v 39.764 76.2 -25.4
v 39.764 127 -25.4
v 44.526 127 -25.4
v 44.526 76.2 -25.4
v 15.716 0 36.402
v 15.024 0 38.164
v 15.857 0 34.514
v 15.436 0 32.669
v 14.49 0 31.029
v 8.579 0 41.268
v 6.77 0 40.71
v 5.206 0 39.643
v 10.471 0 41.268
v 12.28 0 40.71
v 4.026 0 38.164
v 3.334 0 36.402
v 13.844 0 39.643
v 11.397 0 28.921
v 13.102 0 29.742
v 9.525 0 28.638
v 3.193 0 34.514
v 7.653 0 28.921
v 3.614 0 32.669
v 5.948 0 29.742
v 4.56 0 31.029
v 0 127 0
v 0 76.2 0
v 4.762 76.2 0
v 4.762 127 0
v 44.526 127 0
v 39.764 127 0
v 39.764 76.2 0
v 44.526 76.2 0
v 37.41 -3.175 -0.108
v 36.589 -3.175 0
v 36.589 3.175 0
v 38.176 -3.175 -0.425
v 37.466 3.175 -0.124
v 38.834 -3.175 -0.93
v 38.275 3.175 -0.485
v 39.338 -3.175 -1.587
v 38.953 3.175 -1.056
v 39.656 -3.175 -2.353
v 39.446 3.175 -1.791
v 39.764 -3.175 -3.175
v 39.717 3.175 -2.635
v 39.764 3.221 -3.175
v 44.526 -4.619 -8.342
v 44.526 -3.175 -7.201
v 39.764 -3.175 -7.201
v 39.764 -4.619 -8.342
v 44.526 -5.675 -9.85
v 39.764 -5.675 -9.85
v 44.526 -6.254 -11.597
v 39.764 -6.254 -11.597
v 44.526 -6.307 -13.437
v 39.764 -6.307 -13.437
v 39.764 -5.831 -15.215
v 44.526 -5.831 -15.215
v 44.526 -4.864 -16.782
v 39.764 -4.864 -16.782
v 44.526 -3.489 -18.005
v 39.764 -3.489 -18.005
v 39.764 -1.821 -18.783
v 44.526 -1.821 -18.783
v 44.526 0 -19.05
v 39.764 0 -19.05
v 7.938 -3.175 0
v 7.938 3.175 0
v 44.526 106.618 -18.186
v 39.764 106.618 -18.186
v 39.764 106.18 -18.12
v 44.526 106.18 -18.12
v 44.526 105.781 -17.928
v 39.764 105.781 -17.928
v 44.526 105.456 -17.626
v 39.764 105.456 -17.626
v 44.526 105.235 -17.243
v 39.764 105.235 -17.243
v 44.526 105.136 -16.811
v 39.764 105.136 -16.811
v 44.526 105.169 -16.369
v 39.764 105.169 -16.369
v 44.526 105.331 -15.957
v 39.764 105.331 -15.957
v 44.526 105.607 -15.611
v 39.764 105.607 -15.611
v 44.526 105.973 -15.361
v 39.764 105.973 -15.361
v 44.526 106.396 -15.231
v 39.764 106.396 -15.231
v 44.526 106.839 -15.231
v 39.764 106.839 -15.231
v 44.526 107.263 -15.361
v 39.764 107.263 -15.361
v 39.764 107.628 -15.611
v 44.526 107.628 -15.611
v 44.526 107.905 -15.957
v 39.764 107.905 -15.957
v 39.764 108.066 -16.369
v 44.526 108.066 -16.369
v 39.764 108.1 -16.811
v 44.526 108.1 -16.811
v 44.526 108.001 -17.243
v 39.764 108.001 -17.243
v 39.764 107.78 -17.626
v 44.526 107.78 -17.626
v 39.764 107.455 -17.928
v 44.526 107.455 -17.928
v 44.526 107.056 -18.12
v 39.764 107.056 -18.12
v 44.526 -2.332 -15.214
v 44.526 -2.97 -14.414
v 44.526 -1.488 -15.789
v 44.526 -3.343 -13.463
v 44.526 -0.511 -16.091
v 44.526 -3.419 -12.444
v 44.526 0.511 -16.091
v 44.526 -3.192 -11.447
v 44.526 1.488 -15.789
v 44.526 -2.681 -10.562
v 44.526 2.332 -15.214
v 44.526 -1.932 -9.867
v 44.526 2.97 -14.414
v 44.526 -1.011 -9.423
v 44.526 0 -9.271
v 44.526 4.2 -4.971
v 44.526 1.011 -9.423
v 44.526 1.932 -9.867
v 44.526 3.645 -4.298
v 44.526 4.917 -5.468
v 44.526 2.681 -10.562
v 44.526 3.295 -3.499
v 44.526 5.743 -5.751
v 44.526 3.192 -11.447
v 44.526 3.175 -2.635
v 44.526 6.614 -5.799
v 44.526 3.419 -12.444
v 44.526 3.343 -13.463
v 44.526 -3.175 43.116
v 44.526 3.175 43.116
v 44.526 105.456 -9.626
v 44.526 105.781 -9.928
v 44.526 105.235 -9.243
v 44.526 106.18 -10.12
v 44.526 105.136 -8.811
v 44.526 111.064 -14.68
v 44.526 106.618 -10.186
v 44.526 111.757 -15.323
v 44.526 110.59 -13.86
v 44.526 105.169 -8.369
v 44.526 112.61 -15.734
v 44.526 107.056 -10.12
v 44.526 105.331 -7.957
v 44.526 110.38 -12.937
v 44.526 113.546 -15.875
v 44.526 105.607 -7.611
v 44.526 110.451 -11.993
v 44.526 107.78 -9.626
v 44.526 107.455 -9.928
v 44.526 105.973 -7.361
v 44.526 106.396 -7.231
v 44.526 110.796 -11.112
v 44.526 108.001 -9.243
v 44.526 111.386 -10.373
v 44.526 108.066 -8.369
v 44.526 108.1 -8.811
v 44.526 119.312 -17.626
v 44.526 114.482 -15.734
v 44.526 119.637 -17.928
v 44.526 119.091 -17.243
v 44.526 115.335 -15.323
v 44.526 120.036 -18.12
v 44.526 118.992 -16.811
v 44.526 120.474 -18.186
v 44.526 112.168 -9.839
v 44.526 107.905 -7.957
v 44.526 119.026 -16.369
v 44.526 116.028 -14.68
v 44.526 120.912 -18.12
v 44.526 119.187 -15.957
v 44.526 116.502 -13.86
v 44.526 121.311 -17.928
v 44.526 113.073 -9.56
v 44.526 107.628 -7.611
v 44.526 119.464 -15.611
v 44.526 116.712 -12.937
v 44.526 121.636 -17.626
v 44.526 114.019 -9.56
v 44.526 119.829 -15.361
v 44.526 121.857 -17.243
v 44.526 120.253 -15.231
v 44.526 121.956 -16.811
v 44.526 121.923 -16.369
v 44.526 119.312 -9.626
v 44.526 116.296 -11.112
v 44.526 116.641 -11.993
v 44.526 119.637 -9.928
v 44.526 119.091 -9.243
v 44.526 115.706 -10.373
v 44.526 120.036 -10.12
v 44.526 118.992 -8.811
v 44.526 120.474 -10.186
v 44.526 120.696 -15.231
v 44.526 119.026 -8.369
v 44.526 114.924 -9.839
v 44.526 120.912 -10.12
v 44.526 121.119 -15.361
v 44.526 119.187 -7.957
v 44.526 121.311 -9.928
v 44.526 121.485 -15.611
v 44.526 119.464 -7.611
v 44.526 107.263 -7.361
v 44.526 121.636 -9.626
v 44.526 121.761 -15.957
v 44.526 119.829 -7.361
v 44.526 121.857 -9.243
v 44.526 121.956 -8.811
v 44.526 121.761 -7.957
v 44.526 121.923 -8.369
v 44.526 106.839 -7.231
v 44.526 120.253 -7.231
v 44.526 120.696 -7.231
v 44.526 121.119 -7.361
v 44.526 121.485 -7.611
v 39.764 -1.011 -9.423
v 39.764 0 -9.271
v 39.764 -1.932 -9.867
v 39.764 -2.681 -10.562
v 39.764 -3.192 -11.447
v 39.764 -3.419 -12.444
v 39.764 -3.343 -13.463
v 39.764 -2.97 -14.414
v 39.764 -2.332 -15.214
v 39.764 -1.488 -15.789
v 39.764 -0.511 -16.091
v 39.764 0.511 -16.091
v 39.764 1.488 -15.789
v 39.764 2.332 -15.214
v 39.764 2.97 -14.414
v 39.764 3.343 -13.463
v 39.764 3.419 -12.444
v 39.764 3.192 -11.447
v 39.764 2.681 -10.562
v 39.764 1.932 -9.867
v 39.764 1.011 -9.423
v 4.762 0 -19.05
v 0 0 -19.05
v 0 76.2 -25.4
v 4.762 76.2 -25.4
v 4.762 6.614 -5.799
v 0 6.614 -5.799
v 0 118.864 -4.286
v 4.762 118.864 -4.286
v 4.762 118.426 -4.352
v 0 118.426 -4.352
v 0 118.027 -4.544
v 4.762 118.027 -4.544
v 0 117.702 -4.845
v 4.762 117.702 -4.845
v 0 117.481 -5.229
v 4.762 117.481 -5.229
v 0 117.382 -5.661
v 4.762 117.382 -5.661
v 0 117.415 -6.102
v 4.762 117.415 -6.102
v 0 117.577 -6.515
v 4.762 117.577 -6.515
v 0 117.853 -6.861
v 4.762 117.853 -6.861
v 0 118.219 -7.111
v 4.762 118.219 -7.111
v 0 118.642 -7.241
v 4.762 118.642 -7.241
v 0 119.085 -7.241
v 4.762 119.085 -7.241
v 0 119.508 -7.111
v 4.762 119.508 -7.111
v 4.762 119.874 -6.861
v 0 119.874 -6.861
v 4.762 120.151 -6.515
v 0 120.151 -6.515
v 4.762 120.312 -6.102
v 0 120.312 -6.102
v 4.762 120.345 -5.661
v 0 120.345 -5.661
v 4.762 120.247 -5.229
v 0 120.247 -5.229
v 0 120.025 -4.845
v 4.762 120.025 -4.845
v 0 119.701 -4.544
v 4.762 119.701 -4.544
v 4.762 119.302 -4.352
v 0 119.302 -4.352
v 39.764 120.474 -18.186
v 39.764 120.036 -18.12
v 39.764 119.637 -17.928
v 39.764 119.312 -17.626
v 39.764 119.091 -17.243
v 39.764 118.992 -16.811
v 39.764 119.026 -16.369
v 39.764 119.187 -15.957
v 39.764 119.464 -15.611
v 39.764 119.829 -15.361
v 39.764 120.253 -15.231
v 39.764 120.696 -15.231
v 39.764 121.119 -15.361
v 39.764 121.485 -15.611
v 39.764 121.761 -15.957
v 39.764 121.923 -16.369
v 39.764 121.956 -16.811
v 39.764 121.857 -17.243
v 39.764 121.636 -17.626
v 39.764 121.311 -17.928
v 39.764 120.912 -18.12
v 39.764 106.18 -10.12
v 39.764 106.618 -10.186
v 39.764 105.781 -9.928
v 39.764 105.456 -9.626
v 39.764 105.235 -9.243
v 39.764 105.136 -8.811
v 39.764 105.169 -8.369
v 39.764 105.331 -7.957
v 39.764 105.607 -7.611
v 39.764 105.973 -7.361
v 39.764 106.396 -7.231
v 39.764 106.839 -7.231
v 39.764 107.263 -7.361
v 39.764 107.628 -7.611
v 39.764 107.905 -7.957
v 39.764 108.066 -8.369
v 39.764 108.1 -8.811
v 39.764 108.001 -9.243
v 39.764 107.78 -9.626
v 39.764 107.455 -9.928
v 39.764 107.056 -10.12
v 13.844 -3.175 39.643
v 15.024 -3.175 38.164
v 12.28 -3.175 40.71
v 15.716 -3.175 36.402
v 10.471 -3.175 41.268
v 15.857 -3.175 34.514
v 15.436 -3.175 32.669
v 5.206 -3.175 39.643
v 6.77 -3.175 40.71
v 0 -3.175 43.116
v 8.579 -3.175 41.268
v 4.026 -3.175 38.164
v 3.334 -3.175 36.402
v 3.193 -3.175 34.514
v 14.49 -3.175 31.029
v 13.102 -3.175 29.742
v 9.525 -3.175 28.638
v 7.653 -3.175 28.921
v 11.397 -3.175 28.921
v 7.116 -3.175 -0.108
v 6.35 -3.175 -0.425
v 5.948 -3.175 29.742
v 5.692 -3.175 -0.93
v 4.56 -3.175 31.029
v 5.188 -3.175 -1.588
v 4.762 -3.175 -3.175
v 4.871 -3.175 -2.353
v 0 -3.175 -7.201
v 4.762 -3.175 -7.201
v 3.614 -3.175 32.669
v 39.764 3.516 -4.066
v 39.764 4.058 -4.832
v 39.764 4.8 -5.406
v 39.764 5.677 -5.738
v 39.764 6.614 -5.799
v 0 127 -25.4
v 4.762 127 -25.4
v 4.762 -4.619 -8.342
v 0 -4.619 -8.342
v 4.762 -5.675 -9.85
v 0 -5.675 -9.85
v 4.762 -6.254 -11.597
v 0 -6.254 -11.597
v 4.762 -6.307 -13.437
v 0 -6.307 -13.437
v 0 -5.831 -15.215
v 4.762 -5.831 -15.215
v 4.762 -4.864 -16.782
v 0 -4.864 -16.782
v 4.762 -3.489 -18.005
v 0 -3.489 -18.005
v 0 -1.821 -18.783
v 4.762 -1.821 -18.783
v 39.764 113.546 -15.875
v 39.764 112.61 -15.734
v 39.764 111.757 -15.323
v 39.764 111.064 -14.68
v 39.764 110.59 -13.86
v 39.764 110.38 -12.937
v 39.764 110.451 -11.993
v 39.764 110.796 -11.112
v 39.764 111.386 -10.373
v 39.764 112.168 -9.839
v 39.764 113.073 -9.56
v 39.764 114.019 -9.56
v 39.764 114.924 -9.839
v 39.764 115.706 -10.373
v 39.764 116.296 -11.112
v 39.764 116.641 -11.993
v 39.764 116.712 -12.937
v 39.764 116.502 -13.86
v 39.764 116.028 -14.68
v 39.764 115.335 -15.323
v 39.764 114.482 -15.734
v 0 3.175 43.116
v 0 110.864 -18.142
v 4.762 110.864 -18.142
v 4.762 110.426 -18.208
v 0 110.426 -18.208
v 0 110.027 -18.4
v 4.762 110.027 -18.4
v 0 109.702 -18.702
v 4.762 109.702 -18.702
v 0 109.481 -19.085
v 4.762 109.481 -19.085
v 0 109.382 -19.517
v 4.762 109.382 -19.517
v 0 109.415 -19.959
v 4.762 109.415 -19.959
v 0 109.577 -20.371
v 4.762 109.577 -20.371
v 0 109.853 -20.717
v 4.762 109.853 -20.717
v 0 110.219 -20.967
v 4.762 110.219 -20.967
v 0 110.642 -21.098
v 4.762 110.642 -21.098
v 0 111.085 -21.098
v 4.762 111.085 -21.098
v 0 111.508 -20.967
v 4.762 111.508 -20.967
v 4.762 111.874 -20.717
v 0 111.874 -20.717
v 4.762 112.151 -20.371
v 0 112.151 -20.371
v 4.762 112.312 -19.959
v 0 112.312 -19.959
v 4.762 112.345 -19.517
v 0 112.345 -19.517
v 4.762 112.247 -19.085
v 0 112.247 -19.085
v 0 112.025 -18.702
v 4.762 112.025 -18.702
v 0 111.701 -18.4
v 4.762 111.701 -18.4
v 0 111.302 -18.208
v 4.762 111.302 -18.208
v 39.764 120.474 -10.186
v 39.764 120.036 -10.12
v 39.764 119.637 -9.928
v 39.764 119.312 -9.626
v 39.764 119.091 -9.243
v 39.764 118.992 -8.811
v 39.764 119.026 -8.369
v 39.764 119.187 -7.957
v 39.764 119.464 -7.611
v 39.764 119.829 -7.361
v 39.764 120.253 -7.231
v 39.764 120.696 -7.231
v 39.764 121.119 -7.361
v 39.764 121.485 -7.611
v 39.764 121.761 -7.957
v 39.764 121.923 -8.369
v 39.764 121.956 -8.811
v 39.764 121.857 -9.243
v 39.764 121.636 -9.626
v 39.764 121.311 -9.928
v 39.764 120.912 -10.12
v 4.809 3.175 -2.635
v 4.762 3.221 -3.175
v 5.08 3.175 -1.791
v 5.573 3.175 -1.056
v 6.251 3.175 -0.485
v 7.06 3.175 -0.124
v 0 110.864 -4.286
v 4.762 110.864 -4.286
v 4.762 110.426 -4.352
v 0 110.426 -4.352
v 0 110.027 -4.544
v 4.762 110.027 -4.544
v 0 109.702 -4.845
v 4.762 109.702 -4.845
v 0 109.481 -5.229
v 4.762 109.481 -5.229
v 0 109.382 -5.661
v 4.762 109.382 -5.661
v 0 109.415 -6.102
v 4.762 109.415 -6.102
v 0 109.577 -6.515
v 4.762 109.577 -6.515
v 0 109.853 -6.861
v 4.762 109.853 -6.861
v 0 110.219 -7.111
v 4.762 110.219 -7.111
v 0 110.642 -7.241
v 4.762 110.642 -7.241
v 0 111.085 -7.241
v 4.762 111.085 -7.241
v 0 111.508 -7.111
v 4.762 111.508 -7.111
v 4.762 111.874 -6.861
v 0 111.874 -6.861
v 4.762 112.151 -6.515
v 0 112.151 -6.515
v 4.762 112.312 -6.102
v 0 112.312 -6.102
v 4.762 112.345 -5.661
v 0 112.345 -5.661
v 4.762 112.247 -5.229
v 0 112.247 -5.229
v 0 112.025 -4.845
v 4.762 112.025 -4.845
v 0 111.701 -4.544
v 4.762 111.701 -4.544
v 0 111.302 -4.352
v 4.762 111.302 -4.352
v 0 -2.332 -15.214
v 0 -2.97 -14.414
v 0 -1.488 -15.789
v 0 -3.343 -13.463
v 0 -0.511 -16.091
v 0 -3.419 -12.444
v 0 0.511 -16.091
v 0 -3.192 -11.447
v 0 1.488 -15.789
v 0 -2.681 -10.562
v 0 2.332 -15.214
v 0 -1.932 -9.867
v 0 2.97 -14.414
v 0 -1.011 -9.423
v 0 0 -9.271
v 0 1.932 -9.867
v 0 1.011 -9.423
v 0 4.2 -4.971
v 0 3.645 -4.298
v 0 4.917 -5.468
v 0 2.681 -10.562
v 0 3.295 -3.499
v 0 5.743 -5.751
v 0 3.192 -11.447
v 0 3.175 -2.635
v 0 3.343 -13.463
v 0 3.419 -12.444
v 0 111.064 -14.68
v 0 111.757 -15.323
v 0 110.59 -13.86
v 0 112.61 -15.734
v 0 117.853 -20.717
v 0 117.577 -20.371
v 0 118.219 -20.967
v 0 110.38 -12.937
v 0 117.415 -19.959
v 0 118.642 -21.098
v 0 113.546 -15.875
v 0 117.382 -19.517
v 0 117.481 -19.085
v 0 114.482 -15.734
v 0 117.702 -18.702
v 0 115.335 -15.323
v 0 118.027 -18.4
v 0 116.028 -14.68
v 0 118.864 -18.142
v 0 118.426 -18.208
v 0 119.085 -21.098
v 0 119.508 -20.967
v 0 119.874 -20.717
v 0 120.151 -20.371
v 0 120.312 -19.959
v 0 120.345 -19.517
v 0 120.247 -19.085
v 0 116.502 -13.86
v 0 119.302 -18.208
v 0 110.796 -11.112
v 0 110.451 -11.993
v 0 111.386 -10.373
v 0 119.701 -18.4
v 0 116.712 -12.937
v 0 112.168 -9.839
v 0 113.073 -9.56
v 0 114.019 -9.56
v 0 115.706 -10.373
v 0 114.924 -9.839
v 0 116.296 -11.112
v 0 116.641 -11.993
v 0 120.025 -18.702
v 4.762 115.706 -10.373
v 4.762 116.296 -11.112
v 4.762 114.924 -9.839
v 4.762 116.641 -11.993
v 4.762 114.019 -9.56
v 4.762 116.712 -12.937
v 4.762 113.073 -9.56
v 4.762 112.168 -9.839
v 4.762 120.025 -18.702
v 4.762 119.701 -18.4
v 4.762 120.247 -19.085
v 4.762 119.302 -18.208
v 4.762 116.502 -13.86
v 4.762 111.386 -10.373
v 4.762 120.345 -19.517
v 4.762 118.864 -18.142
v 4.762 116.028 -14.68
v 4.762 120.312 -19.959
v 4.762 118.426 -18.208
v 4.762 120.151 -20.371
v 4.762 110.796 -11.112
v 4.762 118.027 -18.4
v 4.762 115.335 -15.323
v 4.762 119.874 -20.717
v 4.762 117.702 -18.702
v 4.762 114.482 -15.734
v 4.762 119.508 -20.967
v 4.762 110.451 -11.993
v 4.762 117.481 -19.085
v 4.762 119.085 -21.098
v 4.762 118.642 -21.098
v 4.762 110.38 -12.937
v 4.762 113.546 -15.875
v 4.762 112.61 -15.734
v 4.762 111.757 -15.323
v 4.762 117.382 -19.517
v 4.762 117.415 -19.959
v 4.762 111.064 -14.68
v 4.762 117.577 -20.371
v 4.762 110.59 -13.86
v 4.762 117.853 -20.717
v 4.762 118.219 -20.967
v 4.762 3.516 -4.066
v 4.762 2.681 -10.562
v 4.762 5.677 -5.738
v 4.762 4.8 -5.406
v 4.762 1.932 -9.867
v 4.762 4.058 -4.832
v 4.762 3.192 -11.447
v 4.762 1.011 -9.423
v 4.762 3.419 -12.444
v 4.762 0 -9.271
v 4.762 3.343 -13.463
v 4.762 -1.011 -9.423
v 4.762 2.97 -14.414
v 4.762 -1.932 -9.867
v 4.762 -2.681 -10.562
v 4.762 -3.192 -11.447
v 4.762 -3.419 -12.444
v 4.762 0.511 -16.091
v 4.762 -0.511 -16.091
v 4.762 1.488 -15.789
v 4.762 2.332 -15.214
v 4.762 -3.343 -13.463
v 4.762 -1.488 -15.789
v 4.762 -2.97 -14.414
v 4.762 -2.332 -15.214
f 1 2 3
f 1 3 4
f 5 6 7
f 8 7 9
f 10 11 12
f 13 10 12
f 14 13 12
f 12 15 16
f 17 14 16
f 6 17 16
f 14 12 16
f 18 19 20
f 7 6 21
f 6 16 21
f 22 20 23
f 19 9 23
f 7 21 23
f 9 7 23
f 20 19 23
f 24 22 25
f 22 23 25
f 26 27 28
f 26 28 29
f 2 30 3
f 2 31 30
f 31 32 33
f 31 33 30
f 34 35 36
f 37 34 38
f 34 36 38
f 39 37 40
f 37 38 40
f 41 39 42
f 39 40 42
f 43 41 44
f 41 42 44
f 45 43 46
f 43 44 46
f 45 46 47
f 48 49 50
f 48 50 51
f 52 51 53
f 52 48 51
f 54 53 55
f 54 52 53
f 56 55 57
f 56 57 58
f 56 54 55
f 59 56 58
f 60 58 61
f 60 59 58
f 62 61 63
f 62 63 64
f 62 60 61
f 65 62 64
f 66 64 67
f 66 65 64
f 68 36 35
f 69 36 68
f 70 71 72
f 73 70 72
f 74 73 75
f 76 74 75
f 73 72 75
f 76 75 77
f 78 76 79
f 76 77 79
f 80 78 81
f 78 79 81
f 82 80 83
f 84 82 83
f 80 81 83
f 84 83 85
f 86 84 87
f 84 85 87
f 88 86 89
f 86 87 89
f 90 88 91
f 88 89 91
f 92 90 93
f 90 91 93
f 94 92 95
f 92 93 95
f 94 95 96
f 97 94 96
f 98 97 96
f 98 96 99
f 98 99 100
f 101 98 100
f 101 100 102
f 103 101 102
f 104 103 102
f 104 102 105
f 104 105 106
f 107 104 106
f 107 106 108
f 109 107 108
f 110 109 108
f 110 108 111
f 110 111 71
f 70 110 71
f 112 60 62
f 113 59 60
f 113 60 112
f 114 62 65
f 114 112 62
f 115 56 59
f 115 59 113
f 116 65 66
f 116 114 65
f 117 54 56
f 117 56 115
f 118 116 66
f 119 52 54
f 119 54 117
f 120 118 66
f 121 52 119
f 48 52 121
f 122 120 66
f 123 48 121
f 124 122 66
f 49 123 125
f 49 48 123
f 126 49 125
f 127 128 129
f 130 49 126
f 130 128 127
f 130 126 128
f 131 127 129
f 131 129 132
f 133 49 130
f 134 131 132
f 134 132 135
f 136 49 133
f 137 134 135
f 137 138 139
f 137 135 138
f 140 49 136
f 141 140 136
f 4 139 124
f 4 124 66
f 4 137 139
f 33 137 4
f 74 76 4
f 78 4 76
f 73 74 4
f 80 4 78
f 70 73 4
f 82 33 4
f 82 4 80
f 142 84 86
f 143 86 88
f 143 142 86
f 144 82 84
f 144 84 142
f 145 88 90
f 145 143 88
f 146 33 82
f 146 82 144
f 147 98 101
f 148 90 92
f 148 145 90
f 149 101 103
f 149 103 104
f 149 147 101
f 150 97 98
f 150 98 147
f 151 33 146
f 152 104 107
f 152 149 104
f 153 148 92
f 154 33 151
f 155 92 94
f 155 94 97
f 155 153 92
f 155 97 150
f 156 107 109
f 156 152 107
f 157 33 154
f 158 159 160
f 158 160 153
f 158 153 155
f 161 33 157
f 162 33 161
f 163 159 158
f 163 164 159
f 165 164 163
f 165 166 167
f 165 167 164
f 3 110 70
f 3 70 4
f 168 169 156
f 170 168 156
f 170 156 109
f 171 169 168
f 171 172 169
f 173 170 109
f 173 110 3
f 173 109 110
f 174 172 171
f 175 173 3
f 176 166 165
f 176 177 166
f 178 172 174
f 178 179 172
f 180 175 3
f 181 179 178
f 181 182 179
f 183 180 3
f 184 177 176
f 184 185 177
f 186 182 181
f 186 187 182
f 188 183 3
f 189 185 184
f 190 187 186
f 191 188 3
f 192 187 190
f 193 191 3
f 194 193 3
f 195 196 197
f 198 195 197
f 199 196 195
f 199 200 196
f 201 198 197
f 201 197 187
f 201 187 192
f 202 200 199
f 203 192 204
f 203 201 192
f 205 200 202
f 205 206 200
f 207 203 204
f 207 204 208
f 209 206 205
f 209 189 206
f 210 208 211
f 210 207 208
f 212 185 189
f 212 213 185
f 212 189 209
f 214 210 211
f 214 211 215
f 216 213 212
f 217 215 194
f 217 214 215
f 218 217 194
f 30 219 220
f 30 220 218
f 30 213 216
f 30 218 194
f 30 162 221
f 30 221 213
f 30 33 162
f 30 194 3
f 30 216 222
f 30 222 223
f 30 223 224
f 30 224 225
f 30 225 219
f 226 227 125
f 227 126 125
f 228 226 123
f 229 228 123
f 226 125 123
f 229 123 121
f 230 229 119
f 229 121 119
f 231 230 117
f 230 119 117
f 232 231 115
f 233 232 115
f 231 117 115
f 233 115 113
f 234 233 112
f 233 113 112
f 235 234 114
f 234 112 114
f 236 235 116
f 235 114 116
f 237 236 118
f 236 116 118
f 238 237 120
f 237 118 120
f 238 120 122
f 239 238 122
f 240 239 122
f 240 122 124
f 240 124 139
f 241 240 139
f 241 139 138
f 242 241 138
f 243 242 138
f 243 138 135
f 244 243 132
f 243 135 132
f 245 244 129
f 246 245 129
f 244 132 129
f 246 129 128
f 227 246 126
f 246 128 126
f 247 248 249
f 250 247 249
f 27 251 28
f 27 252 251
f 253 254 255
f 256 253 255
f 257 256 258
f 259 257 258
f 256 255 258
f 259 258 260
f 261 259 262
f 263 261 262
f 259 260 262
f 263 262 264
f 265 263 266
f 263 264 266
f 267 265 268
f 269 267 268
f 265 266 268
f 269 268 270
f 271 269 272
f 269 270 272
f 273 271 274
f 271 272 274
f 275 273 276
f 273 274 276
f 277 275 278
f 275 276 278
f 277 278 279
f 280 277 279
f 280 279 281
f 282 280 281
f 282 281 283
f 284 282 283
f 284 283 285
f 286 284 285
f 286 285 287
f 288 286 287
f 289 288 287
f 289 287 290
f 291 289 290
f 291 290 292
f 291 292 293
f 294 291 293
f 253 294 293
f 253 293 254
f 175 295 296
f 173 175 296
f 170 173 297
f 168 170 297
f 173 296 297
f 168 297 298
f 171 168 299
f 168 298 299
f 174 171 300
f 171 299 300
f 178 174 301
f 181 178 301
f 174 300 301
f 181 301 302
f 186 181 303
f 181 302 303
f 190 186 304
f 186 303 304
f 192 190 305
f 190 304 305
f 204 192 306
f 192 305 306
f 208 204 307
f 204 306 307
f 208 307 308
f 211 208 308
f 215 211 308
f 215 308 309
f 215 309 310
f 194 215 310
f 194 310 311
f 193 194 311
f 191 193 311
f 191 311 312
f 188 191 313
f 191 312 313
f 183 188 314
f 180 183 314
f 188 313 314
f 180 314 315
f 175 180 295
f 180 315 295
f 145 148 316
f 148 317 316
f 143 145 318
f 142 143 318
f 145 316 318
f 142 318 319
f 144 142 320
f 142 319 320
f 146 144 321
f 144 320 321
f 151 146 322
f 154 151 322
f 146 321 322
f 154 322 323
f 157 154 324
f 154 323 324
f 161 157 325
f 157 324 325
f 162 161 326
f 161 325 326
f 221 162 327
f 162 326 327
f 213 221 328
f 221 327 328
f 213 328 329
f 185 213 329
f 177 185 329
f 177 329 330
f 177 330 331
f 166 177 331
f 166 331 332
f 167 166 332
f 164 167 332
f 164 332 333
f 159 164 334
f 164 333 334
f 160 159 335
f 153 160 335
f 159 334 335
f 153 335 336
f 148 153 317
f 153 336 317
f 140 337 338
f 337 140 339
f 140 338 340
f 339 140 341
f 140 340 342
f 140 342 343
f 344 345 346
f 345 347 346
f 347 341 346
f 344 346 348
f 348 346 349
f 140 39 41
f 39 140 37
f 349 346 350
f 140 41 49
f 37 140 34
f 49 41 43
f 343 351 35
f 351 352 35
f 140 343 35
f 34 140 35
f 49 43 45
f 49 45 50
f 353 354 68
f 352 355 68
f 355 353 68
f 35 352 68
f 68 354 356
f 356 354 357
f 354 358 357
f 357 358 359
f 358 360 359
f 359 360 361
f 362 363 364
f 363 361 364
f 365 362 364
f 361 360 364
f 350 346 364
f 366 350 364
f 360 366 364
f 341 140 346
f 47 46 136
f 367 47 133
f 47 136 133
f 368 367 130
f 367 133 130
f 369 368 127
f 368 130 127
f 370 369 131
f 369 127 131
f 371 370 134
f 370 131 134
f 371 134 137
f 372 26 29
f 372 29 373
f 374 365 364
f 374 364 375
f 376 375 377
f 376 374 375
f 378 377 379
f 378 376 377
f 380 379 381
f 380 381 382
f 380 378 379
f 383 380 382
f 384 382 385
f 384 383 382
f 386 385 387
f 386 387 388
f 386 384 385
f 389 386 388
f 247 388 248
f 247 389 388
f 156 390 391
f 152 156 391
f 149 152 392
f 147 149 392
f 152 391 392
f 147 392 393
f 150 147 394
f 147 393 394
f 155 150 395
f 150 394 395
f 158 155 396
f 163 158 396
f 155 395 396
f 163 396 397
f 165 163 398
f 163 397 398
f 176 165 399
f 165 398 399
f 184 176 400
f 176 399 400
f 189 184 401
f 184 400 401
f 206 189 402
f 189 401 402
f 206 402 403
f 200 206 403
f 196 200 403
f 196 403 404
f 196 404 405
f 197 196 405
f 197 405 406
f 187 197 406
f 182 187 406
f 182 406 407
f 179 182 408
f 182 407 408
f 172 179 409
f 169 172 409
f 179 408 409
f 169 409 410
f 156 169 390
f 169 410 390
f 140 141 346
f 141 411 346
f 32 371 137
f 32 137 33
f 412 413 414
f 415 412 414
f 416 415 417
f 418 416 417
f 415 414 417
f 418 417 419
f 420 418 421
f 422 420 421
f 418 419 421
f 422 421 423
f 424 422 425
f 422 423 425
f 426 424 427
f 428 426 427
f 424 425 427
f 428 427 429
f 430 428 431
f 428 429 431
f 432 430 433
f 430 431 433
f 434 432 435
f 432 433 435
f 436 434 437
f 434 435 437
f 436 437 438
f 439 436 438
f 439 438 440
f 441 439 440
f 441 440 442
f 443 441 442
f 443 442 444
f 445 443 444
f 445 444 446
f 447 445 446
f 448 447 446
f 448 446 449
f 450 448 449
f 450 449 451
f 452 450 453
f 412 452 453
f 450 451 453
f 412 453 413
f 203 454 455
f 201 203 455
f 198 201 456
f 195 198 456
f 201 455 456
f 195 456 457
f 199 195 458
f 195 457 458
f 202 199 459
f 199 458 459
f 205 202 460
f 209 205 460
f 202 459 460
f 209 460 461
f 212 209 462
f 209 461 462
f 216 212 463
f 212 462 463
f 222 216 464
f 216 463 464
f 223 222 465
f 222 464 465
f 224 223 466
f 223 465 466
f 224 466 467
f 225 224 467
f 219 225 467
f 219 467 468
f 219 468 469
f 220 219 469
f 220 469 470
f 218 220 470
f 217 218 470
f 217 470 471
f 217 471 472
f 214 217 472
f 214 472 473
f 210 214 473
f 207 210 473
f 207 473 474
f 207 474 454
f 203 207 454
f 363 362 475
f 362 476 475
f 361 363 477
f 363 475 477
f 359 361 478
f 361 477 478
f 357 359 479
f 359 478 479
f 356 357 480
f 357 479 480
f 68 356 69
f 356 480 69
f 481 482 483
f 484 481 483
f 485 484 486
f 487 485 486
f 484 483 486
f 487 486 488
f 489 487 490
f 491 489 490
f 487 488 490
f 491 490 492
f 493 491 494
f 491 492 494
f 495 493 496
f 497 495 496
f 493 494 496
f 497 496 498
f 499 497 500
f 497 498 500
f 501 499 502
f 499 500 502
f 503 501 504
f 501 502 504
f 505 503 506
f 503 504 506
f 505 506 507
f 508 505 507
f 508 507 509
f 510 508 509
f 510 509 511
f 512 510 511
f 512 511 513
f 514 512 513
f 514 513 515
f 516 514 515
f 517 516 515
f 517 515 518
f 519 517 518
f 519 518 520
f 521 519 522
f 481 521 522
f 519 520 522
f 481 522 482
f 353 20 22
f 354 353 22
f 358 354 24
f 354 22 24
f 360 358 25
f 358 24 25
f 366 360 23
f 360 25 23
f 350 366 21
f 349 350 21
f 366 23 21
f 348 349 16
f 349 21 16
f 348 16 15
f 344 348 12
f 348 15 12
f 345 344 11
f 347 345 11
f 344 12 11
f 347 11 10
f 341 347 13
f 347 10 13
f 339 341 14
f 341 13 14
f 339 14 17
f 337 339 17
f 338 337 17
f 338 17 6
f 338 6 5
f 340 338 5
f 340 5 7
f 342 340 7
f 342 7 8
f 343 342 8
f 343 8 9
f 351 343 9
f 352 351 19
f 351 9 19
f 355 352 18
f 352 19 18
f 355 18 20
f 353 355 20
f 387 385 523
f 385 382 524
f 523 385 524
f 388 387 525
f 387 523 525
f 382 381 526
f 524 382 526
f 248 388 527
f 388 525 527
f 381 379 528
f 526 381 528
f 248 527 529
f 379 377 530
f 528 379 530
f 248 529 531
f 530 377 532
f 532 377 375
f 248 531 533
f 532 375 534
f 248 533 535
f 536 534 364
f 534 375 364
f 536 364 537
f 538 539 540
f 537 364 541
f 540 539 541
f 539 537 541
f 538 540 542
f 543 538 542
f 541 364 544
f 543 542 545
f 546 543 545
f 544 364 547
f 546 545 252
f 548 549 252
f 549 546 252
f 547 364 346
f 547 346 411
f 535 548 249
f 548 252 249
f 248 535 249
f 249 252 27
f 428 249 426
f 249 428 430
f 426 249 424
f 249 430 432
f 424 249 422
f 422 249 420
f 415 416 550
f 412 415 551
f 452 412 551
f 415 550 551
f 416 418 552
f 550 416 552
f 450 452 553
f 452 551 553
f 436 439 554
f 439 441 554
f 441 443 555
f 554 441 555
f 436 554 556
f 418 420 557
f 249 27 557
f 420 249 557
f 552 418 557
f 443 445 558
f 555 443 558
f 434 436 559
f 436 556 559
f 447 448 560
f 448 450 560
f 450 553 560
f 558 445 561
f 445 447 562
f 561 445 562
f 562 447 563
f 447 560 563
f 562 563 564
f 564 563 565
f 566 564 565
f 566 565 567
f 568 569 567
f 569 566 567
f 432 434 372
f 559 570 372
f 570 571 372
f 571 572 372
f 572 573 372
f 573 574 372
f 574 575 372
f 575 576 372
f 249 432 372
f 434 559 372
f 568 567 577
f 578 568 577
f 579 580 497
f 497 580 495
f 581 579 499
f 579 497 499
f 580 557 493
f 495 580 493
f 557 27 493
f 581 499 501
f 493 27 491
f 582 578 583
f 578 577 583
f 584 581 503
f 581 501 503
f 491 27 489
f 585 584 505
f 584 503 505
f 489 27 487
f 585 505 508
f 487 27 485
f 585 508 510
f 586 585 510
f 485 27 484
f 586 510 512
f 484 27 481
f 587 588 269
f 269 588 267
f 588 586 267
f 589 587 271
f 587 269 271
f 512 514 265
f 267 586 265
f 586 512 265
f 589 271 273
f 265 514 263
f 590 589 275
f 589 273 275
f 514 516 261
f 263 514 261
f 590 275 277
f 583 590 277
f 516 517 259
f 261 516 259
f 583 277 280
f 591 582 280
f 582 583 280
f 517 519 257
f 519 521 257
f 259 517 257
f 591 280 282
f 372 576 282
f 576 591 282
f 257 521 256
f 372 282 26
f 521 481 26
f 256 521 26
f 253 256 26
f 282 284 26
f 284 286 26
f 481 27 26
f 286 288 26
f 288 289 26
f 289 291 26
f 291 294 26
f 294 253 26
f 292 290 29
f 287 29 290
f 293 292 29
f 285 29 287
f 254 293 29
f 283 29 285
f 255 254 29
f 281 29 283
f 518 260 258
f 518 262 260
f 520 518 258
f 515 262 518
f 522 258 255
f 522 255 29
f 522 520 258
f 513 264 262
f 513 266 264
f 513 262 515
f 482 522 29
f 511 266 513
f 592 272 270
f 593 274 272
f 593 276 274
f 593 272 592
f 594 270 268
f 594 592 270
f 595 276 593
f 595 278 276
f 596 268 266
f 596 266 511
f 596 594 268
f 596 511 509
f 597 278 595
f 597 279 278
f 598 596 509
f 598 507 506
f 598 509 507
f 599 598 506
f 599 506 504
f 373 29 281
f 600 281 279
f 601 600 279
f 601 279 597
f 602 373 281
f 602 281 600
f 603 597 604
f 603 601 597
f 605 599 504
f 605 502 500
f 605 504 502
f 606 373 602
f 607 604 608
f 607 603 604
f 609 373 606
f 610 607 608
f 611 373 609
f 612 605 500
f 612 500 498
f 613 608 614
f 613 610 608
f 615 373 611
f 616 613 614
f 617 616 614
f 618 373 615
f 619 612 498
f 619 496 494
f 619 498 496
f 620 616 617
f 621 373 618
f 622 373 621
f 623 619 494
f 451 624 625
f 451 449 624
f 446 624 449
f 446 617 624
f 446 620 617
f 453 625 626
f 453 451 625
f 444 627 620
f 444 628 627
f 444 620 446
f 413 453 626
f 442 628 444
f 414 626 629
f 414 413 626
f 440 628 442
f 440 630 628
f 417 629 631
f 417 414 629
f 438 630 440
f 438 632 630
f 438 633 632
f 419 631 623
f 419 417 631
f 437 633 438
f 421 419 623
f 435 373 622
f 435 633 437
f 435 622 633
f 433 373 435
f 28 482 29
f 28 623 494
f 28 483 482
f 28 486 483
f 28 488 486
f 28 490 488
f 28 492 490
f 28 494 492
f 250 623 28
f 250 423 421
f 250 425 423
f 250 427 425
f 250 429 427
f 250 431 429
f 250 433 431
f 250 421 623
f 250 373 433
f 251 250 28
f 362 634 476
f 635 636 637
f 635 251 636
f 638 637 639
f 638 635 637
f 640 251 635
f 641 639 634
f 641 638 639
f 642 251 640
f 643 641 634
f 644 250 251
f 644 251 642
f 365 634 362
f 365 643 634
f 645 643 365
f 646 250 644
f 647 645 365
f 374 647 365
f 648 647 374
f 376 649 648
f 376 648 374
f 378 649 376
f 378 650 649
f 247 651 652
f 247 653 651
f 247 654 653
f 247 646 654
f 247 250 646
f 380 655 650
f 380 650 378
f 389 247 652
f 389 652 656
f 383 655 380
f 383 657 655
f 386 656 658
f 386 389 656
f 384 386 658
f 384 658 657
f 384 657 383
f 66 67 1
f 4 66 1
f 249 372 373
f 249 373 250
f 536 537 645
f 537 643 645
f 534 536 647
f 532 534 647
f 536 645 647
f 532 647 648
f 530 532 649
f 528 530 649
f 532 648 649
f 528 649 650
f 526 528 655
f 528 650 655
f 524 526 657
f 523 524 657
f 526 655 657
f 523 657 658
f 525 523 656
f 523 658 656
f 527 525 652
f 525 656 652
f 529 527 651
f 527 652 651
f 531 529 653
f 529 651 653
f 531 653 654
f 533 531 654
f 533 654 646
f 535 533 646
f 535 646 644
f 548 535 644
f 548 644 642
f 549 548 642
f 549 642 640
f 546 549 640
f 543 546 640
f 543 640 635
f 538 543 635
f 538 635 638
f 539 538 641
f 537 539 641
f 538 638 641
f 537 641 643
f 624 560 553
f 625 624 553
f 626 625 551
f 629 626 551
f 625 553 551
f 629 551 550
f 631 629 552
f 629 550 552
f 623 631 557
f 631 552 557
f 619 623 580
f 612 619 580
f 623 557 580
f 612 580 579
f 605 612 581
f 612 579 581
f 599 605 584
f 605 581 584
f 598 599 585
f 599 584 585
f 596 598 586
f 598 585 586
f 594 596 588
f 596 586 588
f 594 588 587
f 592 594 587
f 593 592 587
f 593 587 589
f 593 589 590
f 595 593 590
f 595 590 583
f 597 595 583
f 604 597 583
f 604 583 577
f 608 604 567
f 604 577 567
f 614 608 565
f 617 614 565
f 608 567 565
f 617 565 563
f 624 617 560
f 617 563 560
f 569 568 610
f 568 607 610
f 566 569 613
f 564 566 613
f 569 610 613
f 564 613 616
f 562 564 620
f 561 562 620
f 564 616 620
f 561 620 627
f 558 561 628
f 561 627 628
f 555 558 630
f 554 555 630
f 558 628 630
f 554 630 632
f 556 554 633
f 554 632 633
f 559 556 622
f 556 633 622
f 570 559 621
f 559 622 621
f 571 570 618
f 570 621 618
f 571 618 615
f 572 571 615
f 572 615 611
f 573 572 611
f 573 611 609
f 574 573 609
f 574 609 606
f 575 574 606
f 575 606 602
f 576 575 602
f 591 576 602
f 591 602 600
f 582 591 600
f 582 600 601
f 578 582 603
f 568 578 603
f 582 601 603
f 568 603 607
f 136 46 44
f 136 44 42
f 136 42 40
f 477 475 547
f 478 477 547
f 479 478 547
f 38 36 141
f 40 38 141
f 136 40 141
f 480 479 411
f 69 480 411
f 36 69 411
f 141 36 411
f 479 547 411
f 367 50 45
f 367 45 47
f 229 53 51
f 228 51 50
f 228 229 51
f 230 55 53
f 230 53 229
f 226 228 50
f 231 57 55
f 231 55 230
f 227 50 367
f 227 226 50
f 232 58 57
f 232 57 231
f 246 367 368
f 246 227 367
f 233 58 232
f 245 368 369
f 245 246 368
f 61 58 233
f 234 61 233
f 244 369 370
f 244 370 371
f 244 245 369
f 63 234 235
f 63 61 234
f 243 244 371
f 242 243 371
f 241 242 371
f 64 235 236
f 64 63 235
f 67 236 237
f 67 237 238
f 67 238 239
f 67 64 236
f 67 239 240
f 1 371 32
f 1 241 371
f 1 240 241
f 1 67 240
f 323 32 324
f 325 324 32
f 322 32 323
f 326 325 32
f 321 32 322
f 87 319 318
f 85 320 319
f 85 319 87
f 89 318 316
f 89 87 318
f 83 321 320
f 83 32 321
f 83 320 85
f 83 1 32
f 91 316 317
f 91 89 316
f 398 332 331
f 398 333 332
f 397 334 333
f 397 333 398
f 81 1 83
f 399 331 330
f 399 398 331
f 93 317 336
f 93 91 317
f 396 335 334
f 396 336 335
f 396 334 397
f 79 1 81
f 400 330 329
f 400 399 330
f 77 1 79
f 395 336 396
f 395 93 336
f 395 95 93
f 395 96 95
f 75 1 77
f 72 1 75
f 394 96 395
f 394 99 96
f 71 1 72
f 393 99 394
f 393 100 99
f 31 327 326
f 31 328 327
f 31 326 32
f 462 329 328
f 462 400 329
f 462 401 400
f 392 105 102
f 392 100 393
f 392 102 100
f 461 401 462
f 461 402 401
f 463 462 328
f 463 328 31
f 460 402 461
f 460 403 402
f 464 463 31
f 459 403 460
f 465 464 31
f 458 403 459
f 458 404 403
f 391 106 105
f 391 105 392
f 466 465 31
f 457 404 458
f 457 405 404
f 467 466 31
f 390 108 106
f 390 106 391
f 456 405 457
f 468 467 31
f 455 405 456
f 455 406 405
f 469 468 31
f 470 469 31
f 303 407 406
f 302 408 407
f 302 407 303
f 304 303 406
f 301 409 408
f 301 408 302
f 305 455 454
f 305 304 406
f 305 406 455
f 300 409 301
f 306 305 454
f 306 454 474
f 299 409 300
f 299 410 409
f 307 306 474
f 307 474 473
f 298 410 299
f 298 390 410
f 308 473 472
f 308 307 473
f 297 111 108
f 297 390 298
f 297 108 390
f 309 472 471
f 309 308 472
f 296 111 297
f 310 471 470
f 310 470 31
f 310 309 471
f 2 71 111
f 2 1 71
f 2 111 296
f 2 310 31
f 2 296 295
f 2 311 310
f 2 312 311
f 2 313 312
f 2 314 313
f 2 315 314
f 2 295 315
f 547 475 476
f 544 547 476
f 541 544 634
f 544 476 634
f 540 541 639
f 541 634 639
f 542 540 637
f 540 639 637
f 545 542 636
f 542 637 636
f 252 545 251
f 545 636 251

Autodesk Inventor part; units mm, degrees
ref_plane "YZ Plane" through (0, 0, 0) normal (1, 0, 0) x (0, 1, 0)
ref_plane "XZ Plane" through (0, 0, 0) normal (0, 1, 0) x (-1, 0, 0)
ref_plane "XY Plane" through (0, 0, 0) normal (0, 0, 1) x (1, 0, 0)
sketch "Sketch1" plane through (0, 0, 0) normal (1, 0, 0) x (0, 1, 0)
  line L0 (0, 0) -> (127, 0)
  line L1 (127, 0) -> (127, -25.4)
  line L2 (127, -25.4) -> (0, -25.4)
  line L3 (0, -25.4) -> (0, 0)
  line L4 (0, -6.35) -> (0, -19.05)
  line L5 (0, -6.35) -> (76.2, 0)
  line L6 (0, -19.05) -> (76.2, -25.4)
  dimension "d0" = 127
  dimension "d1" = 25.4
  dimension "d18" = 12.7
  dimension "d19" = 6.35
  dimension "d20" = 50.8
  dimension "d21" = 50.8
ref_plane "Work Plane1" through (44.5262, 0, 0) normal (1, 0, 0) x (0, 0, -1)
sketch "Sketch2" plane through (44.5262, 0, 0) normal (1, 0, 0) x (0, 0, -1)
  line L0 (0, 127) -> (0, 0) projected
  line L1 (0, 0) -> (25.4, 0) projected
  line L2 (25.4, 0) -> (25.4, 127) projected
  line L3 (25.4, 127) -> (0, 127) projected
  line L4 (0, 0) -> (25.4, 0) projected
  circle A0 centre (12.7, 0) radius 6.35
  dimension "d5" = 25.4
  dimension "d6" = 12.7
  dimension "d7" = 12.7
  dimension "d8" = 0
extrude "Extrusion2" add sketch "Sketch2" against normal blind 44.5262 contours A0 L1 | L1 A0
ref_plane "Work Plane2" through (44.5262, 0, 0) normal (1, 0, 0) x (0, 0, -1)
extrude "Extrusion3" add sketch "Sketch1" along normal blind 44.5262 contours L0 L1 L2 L6 L3 L5
sketch "Sketch4" plane through (0, 0, 0) normal (-1, 0, 0) x (0, 0, 1)
  arc A0 (-19.05, 0) -> (-6.35, 0) centre (-12.7, 0) ccw projected
  line L0 (0, 76.2) -> (-6.35, 0) projected
  line L1 (0, 127) -> (0, 76.2) projected
  line L2 (-25.4, 127) -> (0, 127) projected
  line L3 (-25.4, 76.2) -> (-25.4, 127) projected
  line L4 (-19.05, 0) -> (-25.4, 76.2) projected
  point P0 (0, 0)
hole "Hole2" at (0, 0, -12.7) direction (1, 0, 0) diameter 6.858 end through all
sketch "Sketch5" plane through (0, 0, 0) normal (-1, 0, 0) x (0, 0, 1)
  circle A0 centre (-12.7, 0) radius 3.429 projected
  line L0 (0, 76.2) -> (-6.35, 0) projected
  line L1 (0, 127) -> (0, 76.2) projected
  line L2 (-25.4, 127) -> (0, 127) projected
  line L3 (-25.4, 76.2) -> (-25.4, 127) projected
  line L4 (-19.05, 0) -> (-25.4, 76.2) projected
  line L5 (-7.6835, 3.175) -> (43.1165, 3.175)
  line L6 (43.1165, 3.175) -> (43.1165, -3.175)
  line L7 (43.1165, -3.175) -> (-7.6835, -3.175)
  line L8 (-7.6835, -3.175) -> (-7.6835, 3.175)
  arc A1 (-19.05, 0) -> (-6.35, 0) centre (-12.7, 0) ccw projected
  point P0 (0, 0)
  dimension "d31" = 50.8
  dimension "d32" = 6.35
  dimension "d35" = 127
  dimension "d36" = 123.825
  dimension "d95" = 6.858
  dimension "d96" = 5.0165
extrude "Extrusion4" add sketch "Sketch5" against normal blind 44.5262 contours L5 L6 L7 A1 L0 | L0 A1 L7 L8 L5
sketch "Sketch8" plane through (0, 76.2, -25.4) normal (0, 0, -1) x (-1, 0, 0)
  line L0 (0, 0) -> (0, 50.8) projected
  line L1 (0, 50.8) -> (-44.5262, 50.8) projected
  line L2 (-44.5262, 0) -> (-44.5262, 50.8) projected
  line L3 (0, 0) -> (-44.5262, 0) projected
  line L4 (0, -76.2) -> (0, 0) projected
  line L5 (0, 0) -> (-44.5262, 0) projected
  line L6 (-44.5262, -76.2) -> (-44.5262, 0) projected
  line L7 (0, 50.8) -> (-44.5262, 50.8) projected
  line L8 (-39.7637, 50.8) -> (-4.7625, 50.8)
  line L9 (-4.7625, 50.8) -> (-4.7625, -98.425)
  line L10 (-4.7625, -98.425) -> (-39.7637, -98.425)
  line L11 (-39.7637, -98.425) -> (-39.7637, 50.8)
  line L12 (0, -76.2) -> (-44.5262, -76.2) projected
  point P0 (0, -76.2)
  dimension "d41" = 44.5262
  dimension "d43" = 35.0012
  dimension "d44" = 4.7625
  dimension "d45" = 149.225
extrude "Extrusion5" cut sketch "Sketch8" against normal blind 25.4 contours L9 L12 L11 L3 | L3 L11 L1 L9 | L9 L10 L11 L12
fillet "Fillet1" radius 3.175 2 edges at (39.7637, 0, 0) (4.7625, 0, 0)
fillet "Fillet2" radius 3.175 2 edges at (2.3812, 3.175, -6.0854) (42.1449, 3.175, -6.0854)
sketch "Sketch9" plane through (0, 0, 0) normal (-1, 0, 0) x (0, 0, 1)
  line L0 (0, 76.2) -> (-5.7989, 6.6137) projected
  line L1 (0, 127) -> (0, 76.2) projected
  line L2 (-25.4, 127) -> (0, 127) projected
  line L3 (-25.4, 76.2) -> (-25.4, 127) projected
  line L4 (-19.05, 0) -> (-25.4, 76.2) projected
  circle A0 centre (-12.7, 0) radius 3.429 projected
  circle A1 centre (-12.7, 114.8637) radius 8
  line L5 (-19.6282, 118.8637) -> (-5.7718, 118.8637)
  line L6 (-5.7718, 118.8637) -> (-5.7718, 110.8637)
  line L7 (-5.7718, 110.8637) -> (-19.6282, 110.8637)
  line L8 (-19.6282, 110.8637) -> (-19.6282, 118.8637)
  arc A2 (-19.05, 0) -> (-7.2007, -3.175) centre (-12.7, 0) ccw projected
  line L9 (43.1165, -3.175) -> (-7.2007, -3.175) projected
  line L10 (43.1165, 3.175) -> (43.1165, -3.175) projected
  line L11 (-2.6348, 3.175) -> (43.1165, 3.175) projected
  arc A3 (-5.7989, 6.6137) -> (-2.6348, 3.175) centre (-2.6348, 6.35) ccw projected
  point P0 (0, 0)
  dimension "d50" = 16
  dimension "d51" = 25.4
  dimension "d52" = 12.7
  dimension "d53" = 8
  dimension "d54" = 4
hole "Hole3" at (0, 118.8637, -19.6282) at (0, 110.8637, -19.6282) at (0, 118.8637, -5.7718) at (0, 110.8637, -5.7718) direction (1, 0, 0) diameter 2.9718 depth 25.4 tip angle 118
sketch "Sketch10" plane through (44.5262, 0, 0) normal (1, 0, 0) x (0, 0, -1)
  line L0 (19.05, 0) -> (25.4, 76.2) projected
  line L1 (25.4, 76.2) -> (25.4, 127) projected
  line L2 (25.4, 127) -> (0, 127) projected
  line L3 (0, 127) -> (0, 76.2) projected
  line L4 (0, 76.2) -> (5.7989, 6.6137) projected
  circle A0 centre (12.7, 0) radius 3.429 projected
  circle A1 centre (12.7, 113.546) radius 8
  line L5 (16.7, 106.6178) -> (8.7, 106.6178)
  line L6 (8.7, 106.6178) -> (8.7, 120.4742)
  line L7 (8.7, 120.4742) -> (16.7, 120.4742)
  line L8 (16.7, 120.4742) -> (16.7, 106.6178)
  arc A2 (7.2007, -3.175) -> (19.05, 0) centre (12.7, 0) ccw projected
  arc A3 (2.6348, 3.175) -> (5.7989, 6.6137) centre (2.6348, 6.35) ccw projected
  line L9 (2.6348, 3.175) -> (-43.1165, 3.175) projected
  line L10 (-43.1165, 3.175) -> (-43.1165, -3.175) projected
  line L11 (-43.1165, -3.175) -> (7.2007, -3.175) projected
  point P0 (0, 0)
  dimension "d62" = 16
  dimension "d63" = 25.4
  dimension "d64" = 12.7
  dimension "d65" = 8
  dimension "d66" = 4
hole "Hole4" at (44.5262, 106.6178, -16.7) at (44.5262, 106.6178, -8.7) at (44.5262, 120.4742, -8.7) at (44.5262, 120.4742, -16.7) direction (-1, 0, 0) diameter 2.9718 depth 25.4 tip angle 118
sketch "Sketch11" plane through (0, -3.175, -7.2007) normal (0, -1, 0) x (1, 0, 0)
  line L0 (4.7625, 0) -> (4.7625, 4.0257) projected
  arc A0 (7.9375, 7.2007) -> (4.7625, 4.0257) centre (7.9375, 4.0257) ccw projected
  line L1 (7.9375, 7.2007) -> (36.5887, 7.2007) projected
  arc A1 (39.7637, 4.0257) -> (36.5887, 7.2007) centre (36.5887, 4.0257) ccw projected
  line L2 (39.7637, 4.0257) -> (39.7637, 0) projected
  line L3 (44.5262, 50.3172) -> (44.5262, 0) projected
  line L4 (0, 50.3172) -> (44.5262, 50.3172) projected
  line L5 (0, 50.3172) -> (0, 0) projected
  line L6 (44.5262, 0) -> (39.7637, 0) projected
  line L7 (4.7625, 0) -> (0, 0) projected
  point P0 (0, 7.2007)
  point P1 (9.525, 42.1892)
  dimension "d74" = 8.128
  dimension "d75" = 44.5262
  dimension "d97" = 9.525
hole "Hole5" at (9.525, -3.175, 34.9885) direction (0, 1, 0) diameter 12.7 depth 3.175
sketch "Sketch12" plane through (44.5262, 0, 0) normal (1, 0, 0) x (0, 0, -1)
  circle A0 centre (8.7, 120.4742) radius 1.4859 projected
  circle A1 centre (16.7, 106.6178) radius 1.4859 projected
  circle A2 centre (8.7, 106.6178) radius 1.4859 projected
  circle A3 centre (16.7, 120.4742) radius 1.4859 projected
  line L0 (19.05, 0) -> (25.4, 76.2) projected
  line L1 (25.4, 76.2) -> (25.4, 127) projected
  line L2 (25.4, 127) -> (0, 127) projected
  line L3 (0, 127) -> (0, 76.2) projected
  line L4 (0, 76.2) -> (5.7989, 6.6137) projected
  circle A4 centre (12.7, 0) radius 3.429 projected
  arc A5 (7.2007, -3.175) -> (19.05, 0) centre (12.7, 0) ccw projected
  arc A6 (2.6348, 3.175) -> (5.7989, 6.6137) centre (2.6348, 6.35) ccw projected
  line L5 (2.6348, 3.175) -> (-43.1165, 3.175) projected
  line L6 (-43.1165, 3.175) -> (-43.1165, -3.175) projected
  line L7 (-43.1165, -3.175) -> (7.2007, -3.175) projected
  point P0 (0, 0)
  point P1 (12.7, 113.546)
  dimension "d84" = 25.4
  dimension "d85" = 12.7
  dimension "d86" = 13.8564
  dimension "d87" = 6.9282
hole "Hole6" at (44.5262, 113.546, -12.7) direction (-1, 0, 0) diameter 6.35 end through all
equation "\"d19\" = -0.5 * d18 + 0.5 * d1"
equation "\"d21\" = d20"
equation "\"d7\" = 0.5 * d5"
equation "\"d36\" = d35 - 0.5 * d32"
equation "\"d44\" = -0.5 * d43 + 0.5 * d41"
equation "\"d52\" = 0.5 * d51"
equation "\"d54\" = 0.5 * d53"
equation "\"d64\" = 0.5 * d63"
equation "\"d66\" = 0.5 * d65"
equation "\"d87\" = 0.5 * d86"
properties part number "WheelIntakeMount3.0"
